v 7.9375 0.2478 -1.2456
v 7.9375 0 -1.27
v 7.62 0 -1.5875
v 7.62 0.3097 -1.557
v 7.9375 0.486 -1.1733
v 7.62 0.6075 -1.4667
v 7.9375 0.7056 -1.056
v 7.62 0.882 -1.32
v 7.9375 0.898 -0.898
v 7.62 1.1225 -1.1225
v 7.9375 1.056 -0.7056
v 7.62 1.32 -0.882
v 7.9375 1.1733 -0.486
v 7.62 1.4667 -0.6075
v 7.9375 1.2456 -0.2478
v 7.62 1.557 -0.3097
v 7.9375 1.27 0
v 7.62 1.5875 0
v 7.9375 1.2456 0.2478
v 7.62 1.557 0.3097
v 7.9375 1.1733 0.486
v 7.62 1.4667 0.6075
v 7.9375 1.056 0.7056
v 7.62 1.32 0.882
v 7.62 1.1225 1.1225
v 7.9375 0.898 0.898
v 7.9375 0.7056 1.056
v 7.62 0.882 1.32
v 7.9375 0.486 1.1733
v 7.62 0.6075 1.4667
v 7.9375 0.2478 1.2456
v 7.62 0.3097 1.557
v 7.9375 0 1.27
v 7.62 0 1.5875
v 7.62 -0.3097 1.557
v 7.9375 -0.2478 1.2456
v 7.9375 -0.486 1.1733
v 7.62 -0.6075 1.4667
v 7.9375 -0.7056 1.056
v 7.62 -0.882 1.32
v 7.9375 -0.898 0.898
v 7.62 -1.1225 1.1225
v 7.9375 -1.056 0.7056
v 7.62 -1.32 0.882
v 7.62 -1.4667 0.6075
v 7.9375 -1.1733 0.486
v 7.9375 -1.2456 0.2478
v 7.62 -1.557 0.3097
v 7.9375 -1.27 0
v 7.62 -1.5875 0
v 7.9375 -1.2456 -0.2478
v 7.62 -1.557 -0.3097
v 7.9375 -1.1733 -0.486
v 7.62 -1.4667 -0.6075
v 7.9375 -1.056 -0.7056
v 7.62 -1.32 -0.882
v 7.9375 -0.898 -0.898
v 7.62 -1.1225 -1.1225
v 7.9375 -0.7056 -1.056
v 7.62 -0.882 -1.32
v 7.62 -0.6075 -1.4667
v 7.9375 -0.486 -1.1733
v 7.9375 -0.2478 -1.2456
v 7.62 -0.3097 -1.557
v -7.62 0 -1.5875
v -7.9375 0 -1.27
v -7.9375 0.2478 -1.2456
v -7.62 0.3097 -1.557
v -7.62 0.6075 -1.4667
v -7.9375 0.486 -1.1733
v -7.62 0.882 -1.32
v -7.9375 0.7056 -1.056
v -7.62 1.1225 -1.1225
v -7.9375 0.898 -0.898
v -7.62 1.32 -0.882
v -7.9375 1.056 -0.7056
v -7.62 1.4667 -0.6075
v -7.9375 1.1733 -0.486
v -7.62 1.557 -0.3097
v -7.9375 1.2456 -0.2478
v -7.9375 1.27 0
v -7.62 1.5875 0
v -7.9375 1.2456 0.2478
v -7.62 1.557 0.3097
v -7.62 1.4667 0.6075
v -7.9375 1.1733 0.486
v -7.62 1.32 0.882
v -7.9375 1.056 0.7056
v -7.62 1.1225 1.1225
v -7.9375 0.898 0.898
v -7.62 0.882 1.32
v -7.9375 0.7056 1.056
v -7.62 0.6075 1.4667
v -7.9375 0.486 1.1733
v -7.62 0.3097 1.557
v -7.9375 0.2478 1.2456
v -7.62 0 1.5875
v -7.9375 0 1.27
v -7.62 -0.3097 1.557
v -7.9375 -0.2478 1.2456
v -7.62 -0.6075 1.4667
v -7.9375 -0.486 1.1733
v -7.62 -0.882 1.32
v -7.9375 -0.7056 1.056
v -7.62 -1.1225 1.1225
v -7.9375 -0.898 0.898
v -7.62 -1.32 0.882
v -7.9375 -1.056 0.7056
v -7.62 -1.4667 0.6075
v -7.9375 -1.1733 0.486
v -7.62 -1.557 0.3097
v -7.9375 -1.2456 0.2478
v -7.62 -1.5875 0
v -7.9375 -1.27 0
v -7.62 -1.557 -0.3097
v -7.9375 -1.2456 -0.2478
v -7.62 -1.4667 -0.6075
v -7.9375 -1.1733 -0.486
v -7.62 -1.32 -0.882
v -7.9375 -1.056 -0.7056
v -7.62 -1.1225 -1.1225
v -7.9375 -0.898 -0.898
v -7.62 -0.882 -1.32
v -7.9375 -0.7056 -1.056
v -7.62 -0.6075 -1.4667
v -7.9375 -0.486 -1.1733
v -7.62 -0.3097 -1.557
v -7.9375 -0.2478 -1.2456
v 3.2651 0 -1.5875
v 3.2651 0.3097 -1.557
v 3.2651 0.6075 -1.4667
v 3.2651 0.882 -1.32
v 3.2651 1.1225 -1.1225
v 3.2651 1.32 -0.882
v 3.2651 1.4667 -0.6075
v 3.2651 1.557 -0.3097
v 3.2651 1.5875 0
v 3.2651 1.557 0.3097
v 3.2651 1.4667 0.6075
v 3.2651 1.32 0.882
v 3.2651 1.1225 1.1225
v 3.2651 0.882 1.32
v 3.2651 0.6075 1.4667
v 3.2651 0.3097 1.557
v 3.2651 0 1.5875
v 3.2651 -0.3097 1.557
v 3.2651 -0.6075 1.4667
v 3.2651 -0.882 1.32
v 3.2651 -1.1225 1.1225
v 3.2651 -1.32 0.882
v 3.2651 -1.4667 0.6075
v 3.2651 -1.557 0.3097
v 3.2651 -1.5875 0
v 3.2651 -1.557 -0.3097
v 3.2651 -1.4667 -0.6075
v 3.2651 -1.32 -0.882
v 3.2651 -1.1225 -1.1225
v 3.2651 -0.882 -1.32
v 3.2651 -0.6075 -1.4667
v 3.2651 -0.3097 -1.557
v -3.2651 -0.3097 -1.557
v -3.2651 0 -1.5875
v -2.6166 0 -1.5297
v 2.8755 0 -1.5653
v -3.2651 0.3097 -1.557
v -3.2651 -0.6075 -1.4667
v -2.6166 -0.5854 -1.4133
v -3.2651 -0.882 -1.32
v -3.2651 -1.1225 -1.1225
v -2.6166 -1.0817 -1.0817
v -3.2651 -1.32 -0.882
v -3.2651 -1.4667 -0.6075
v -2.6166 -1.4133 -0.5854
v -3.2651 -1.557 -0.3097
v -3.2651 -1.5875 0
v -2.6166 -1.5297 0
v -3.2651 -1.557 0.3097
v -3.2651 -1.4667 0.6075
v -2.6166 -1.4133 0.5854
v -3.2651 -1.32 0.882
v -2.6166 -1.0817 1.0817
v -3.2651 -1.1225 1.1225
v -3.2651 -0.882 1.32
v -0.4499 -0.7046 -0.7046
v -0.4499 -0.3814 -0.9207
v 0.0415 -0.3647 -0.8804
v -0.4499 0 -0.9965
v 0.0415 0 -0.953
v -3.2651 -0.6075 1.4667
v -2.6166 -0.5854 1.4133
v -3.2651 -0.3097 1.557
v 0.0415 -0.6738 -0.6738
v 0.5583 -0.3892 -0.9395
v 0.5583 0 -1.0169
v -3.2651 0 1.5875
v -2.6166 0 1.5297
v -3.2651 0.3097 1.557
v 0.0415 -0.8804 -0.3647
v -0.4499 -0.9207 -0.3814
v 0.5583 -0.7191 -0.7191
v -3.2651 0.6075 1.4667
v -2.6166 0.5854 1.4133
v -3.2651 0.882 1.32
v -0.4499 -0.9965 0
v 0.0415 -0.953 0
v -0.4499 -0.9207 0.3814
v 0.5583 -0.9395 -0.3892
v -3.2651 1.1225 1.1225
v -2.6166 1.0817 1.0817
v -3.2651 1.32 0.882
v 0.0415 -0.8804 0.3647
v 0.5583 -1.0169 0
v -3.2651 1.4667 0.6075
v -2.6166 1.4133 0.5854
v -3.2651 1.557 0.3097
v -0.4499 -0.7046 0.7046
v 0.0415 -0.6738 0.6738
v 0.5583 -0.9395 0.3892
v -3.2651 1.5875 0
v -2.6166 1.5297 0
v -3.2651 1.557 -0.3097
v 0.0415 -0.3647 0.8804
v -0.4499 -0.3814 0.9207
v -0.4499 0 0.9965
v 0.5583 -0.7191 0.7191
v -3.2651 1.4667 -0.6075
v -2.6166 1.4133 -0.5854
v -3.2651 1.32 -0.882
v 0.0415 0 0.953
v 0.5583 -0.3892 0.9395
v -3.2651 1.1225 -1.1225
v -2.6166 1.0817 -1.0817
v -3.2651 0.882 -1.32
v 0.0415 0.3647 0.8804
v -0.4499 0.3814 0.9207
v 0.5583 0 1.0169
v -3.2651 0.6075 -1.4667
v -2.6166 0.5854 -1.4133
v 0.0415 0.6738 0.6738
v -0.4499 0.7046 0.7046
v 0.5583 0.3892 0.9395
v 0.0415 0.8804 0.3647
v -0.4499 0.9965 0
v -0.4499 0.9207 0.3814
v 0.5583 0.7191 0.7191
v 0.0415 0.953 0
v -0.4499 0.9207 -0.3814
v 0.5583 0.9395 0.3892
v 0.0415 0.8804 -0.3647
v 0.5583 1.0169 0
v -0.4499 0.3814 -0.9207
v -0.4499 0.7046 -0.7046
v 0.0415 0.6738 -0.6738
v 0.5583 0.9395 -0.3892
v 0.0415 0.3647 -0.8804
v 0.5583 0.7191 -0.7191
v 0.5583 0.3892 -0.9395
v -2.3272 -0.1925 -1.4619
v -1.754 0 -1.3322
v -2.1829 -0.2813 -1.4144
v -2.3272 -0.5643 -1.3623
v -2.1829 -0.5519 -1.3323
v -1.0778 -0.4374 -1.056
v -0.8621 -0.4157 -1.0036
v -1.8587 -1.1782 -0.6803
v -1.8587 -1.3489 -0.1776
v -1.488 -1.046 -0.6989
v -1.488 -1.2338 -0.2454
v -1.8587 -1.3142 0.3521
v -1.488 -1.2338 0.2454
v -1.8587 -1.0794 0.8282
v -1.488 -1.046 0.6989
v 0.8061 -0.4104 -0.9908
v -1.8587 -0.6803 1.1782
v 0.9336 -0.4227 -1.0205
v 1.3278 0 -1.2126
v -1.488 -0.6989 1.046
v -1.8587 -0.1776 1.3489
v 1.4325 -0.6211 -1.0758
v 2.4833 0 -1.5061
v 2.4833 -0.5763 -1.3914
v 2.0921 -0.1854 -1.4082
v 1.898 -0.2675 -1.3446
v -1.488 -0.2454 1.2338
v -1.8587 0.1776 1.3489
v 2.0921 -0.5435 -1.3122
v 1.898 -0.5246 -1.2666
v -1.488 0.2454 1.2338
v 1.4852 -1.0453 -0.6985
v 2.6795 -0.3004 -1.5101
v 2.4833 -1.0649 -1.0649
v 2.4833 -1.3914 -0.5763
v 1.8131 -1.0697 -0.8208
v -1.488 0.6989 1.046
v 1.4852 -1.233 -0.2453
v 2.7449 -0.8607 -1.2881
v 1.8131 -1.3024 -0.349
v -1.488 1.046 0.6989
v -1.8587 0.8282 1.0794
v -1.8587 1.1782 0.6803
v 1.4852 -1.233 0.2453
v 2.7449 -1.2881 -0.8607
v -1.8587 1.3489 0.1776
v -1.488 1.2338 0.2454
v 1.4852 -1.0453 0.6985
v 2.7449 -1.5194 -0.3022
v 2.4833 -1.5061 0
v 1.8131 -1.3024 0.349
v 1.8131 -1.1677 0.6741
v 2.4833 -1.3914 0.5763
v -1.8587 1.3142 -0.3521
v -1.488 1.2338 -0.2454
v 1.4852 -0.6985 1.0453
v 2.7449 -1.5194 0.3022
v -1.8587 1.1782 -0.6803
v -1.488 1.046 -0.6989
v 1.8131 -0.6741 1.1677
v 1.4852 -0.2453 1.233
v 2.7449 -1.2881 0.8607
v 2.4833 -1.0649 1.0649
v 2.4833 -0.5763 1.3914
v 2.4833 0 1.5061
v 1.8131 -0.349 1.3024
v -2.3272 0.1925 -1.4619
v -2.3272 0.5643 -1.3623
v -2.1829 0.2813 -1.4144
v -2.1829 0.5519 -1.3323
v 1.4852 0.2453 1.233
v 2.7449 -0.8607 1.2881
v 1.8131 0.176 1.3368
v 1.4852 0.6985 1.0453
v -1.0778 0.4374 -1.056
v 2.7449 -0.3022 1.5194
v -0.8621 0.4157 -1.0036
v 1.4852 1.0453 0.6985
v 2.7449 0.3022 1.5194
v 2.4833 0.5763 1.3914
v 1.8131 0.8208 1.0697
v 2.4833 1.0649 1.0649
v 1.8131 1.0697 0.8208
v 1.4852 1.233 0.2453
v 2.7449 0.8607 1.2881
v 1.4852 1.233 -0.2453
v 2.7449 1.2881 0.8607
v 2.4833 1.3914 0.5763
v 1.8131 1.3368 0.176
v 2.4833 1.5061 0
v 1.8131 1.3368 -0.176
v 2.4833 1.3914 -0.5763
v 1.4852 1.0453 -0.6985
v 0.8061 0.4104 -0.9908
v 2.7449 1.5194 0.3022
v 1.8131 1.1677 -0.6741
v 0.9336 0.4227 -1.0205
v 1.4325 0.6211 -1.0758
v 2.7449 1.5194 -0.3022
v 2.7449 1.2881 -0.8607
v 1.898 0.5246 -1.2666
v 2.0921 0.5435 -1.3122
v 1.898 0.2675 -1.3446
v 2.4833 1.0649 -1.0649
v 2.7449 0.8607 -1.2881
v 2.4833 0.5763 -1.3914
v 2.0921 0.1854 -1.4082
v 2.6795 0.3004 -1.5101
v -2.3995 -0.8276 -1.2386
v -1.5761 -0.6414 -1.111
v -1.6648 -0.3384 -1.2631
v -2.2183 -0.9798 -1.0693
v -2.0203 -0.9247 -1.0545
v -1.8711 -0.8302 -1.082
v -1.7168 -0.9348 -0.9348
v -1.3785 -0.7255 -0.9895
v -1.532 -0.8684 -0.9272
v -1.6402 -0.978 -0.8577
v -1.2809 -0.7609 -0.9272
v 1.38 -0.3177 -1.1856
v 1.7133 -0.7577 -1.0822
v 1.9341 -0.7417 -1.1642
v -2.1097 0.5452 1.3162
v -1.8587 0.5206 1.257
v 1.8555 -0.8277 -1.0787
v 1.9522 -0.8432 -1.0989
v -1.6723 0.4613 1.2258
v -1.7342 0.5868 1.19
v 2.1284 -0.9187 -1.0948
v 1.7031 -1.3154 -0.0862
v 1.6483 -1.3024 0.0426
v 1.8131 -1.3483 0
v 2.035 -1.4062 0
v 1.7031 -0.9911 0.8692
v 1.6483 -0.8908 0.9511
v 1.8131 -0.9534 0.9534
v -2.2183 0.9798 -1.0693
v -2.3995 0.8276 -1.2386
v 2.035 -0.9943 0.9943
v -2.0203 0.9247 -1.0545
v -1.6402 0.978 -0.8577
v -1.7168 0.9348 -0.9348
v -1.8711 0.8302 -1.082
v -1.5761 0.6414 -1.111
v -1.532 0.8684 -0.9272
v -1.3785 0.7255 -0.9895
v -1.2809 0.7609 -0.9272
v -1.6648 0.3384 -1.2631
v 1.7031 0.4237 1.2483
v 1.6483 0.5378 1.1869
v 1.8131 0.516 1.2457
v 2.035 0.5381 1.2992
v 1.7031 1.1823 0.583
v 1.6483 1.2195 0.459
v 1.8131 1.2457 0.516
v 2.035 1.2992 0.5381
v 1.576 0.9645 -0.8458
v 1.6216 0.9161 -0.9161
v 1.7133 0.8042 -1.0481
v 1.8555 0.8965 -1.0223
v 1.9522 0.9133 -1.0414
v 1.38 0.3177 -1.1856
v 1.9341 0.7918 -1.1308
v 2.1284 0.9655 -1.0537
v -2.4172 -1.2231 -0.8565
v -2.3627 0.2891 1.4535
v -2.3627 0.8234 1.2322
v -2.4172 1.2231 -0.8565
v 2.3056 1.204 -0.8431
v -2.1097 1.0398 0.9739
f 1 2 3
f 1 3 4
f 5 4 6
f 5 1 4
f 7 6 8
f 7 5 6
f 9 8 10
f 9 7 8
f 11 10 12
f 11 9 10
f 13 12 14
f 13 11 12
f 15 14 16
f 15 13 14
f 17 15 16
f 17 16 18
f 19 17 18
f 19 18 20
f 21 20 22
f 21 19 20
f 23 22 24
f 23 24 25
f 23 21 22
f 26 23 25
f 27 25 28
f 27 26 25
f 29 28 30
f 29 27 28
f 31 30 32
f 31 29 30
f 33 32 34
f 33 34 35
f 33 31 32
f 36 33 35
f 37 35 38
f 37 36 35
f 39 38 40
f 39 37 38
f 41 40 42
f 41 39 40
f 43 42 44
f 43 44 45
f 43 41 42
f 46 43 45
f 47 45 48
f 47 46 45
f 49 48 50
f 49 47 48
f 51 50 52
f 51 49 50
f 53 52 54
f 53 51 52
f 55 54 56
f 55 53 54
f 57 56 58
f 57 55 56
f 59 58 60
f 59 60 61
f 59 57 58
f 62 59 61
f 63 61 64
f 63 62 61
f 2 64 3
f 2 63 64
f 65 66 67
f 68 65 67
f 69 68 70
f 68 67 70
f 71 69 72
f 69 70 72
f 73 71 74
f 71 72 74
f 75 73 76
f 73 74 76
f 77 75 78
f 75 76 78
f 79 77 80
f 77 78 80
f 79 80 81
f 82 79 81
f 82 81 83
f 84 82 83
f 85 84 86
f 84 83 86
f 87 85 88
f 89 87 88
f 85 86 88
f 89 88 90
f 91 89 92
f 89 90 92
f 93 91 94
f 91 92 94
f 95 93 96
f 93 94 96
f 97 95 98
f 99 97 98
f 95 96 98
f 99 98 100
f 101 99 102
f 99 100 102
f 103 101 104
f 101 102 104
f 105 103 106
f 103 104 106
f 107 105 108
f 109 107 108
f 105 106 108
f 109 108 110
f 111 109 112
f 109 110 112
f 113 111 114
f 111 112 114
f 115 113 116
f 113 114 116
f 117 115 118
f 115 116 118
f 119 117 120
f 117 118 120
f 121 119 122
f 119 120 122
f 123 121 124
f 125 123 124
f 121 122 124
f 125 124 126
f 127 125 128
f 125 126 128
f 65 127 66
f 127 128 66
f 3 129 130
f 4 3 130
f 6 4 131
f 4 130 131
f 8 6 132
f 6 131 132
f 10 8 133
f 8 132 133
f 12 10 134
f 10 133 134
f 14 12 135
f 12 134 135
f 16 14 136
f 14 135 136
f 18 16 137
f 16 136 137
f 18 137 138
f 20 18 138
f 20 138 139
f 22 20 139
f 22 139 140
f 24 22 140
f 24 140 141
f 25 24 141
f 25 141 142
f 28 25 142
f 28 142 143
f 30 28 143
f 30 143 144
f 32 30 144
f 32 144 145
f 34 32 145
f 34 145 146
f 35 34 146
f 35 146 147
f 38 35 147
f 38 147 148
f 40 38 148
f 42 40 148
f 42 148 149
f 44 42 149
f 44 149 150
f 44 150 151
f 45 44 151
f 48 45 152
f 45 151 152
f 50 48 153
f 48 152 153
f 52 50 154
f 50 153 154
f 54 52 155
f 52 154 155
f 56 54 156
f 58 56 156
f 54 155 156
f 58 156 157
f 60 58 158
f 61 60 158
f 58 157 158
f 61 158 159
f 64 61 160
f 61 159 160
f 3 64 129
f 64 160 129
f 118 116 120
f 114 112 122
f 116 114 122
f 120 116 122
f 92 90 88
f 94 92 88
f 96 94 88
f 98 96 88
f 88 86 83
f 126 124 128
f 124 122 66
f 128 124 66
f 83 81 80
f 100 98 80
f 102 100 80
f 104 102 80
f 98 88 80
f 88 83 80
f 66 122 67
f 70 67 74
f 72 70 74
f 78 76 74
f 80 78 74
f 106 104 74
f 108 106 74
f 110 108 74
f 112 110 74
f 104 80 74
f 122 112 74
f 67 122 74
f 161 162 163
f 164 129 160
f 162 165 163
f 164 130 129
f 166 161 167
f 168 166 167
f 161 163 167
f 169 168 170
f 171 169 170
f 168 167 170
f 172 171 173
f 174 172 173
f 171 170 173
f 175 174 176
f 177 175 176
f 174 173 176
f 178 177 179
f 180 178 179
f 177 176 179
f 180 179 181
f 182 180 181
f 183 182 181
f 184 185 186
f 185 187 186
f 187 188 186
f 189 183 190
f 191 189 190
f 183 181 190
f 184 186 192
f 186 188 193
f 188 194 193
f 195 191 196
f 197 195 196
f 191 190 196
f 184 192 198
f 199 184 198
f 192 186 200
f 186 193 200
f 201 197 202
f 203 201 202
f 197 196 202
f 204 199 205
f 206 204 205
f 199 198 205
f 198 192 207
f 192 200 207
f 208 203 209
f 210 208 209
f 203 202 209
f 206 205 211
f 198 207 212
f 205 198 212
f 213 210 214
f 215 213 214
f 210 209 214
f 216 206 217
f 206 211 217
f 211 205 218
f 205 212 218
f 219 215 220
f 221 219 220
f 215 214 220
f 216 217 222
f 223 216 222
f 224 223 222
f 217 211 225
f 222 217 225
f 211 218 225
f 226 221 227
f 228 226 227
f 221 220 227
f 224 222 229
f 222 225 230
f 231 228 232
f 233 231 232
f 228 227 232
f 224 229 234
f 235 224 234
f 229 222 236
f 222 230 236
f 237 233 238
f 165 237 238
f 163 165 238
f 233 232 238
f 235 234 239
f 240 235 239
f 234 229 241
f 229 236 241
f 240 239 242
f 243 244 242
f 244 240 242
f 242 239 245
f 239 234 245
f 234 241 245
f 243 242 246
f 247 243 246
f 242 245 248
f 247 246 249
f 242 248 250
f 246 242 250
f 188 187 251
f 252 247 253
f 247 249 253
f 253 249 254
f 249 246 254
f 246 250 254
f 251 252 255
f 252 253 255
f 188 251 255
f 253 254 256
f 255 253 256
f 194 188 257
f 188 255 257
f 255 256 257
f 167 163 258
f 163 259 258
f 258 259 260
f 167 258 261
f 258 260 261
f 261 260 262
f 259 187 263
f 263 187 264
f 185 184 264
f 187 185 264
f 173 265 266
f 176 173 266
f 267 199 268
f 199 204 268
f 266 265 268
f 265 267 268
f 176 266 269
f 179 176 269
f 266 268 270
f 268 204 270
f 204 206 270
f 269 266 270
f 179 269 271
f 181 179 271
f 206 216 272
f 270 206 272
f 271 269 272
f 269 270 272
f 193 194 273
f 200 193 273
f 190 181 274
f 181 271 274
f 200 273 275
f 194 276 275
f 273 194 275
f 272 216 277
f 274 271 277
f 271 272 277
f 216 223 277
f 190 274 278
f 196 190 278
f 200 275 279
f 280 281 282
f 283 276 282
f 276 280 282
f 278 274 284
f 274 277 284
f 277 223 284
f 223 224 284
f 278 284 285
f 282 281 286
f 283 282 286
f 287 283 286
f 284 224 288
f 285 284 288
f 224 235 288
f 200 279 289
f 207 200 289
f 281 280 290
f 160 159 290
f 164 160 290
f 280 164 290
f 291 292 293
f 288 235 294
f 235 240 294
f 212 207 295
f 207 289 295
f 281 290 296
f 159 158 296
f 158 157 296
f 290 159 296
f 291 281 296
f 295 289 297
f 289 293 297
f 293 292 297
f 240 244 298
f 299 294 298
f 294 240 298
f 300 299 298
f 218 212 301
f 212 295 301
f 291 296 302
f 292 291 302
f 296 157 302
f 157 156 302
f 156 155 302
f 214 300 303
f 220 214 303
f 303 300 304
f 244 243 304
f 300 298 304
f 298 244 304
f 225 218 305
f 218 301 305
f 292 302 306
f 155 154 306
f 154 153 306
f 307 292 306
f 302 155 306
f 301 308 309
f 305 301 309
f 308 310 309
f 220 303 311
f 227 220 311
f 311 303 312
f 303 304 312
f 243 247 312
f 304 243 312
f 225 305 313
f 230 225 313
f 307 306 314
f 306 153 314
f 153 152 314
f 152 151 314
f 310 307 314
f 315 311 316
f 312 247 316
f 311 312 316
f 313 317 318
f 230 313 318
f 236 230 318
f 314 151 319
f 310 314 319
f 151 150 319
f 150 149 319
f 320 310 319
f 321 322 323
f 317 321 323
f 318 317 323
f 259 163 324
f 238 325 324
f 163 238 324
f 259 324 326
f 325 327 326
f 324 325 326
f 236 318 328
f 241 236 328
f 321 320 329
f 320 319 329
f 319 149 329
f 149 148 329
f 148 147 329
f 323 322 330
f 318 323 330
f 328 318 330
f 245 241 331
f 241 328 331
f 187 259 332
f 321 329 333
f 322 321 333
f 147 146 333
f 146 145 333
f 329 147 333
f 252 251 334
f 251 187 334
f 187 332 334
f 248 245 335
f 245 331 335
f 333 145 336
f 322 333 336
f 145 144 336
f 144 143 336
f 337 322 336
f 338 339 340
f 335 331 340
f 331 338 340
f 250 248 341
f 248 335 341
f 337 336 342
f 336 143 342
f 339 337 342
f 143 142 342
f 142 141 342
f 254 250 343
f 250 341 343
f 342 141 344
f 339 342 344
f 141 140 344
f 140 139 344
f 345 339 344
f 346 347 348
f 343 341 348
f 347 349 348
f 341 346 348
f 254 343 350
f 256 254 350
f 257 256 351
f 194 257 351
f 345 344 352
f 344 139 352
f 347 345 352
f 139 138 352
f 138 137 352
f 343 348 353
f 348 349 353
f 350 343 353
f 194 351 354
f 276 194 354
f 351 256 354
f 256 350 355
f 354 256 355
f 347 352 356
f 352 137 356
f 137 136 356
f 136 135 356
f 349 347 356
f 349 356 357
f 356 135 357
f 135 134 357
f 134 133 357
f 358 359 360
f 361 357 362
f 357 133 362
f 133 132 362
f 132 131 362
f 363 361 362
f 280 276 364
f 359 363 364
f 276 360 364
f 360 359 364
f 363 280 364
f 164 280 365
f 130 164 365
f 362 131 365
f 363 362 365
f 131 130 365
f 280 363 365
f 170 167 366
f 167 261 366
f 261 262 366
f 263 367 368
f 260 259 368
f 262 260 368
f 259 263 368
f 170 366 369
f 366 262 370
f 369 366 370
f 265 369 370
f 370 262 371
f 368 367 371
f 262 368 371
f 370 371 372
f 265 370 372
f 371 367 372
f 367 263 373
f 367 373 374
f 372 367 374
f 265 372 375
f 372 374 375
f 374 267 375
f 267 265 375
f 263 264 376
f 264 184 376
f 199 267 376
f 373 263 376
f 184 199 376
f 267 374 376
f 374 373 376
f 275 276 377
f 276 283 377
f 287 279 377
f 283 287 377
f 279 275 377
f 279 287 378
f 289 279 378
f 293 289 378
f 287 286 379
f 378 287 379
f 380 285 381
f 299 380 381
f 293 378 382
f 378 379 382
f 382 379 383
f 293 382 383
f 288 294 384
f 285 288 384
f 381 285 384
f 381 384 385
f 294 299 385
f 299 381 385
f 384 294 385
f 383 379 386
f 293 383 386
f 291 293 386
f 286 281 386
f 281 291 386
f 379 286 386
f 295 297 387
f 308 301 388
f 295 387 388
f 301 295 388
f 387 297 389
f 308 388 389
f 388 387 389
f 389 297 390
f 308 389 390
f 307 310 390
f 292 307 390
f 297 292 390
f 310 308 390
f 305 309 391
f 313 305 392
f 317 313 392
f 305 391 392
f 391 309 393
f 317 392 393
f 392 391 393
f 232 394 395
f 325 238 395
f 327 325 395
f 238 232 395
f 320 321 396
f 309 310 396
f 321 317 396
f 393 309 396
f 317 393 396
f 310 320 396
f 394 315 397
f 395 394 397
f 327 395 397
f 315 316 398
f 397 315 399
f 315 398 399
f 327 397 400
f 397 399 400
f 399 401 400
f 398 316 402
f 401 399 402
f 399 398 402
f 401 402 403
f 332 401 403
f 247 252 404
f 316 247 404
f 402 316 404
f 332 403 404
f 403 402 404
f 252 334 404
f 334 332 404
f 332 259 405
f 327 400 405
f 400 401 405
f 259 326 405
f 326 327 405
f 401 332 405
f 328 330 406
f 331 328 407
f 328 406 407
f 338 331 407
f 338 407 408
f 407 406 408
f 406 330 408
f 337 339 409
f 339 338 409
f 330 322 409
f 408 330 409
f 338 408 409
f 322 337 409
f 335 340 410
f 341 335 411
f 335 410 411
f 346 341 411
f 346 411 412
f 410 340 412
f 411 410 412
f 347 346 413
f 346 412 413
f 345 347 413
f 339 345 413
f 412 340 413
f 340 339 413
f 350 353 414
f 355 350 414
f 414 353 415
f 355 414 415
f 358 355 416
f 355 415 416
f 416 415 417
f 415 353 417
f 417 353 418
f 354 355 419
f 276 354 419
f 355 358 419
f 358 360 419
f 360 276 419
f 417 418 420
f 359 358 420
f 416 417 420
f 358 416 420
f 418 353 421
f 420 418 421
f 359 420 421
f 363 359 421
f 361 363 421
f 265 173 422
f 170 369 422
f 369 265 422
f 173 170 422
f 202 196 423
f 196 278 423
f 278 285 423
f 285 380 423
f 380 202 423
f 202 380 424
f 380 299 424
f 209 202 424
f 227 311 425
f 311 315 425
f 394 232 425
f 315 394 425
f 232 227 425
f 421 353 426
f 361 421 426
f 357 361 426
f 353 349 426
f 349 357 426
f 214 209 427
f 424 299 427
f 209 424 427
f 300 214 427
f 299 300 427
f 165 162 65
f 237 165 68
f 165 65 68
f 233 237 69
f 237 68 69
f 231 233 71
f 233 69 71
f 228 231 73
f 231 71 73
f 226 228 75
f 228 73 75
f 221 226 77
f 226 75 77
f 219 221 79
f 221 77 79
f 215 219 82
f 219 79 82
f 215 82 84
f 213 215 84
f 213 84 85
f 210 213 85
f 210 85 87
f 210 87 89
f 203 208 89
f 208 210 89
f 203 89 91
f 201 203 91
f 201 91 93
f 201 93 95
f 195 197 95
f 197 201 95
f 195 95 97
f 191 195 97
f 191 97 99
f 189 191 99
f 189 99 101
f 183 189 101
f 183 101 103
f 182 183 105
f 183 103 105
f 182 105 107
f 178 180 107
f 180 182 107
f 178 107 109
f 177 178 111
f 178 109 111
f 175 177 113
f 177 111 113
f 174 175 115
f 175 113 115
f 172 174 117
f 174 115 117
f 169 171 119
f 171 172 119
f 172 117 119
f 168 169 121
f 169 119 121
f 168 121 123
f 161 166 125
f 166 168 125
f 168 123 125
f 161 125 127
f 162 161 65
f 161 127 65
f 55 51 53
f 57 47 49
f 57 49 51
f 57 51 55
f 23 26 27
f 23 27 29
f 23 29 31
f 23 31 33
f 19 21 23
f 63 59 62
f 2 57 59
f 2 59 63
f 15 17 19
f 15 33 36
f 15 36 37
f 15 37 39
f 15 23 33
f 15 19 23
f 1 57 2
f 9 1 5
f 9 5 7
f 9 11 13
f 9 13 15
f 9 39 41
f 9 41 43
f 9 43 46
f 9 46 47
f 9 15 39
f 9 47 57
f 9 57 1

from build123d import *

# Parameters (mm, degrees)
EXTRUDE1_DEPTH      = 7.9375
EXTRUDE1_DEPTH_BACK = 7.9375
SKETCH2_R           = 1.5875
CHAMFER1_SIZE       = 0.3175


with BuildPart() as part:
    # Sketch2 → Extrude1 (new, two sides: drawn at the far end of the back side and taken through both)
    with BuildSketch(Plane(origin=(0, 0, 0), x_dir=(0, 0, -1), z_dir=(1, 0, 0)).offset(-EXTRUDE1_DEPTH_BACK)):
        Circle(SKETCH2_R)
    extrude(amount=EXTRUDE1_DEPTH + EXTRUDE1_DEPTH_BACK)

    # Chamfer1
    chamfer1_edges = [part.edges().sort_by_distance(p)[0] for p in [
        (-7.9375, 0, 1.5875),
        (7.9375, 0, 1.5875),
    ]]
    chamfer(chamfer1_edges, length=CHAMFER1_SIZE)

    # Sketch3 → Cut-Revolve1 (revolve, cut)
    with BuildSketch(Plane.XY, mode=Mode.PRIVATE) as cut_revolve1_sk:
        with BuildLine():
            Line((3.265089056, 1.5875), (-3.265089056, 1.5875))
            add(Edge.make_bspline(
                [(-3.265089056, 1.5875), (-2.114433092, 1.5875), (-0.878501649, 0.9525), (0, 0.9525)],
                knots=[0, 0, 0, 0, 1, 1, 1, 1], degree=3))
            add(Edge.make_bspline(
                [(3.265089056, 1.5875), (2.114433092, 1.5875), (0.878501649, 0.9525), (0, 0.9525)],
                knots=[0, 0, 0, 0, 1, 1, 1, 1], degree=3))
        make_face()
    revolve(cut_revolve1_sk.sketch.rotate(Axis((7.9375, 0, 0), (-1, 0, 0)), 90), axis=Axis((7.9375, 0, 0), (-1, 0, 0)), mode=Mode.SUBTRACT)


solid = part.part
